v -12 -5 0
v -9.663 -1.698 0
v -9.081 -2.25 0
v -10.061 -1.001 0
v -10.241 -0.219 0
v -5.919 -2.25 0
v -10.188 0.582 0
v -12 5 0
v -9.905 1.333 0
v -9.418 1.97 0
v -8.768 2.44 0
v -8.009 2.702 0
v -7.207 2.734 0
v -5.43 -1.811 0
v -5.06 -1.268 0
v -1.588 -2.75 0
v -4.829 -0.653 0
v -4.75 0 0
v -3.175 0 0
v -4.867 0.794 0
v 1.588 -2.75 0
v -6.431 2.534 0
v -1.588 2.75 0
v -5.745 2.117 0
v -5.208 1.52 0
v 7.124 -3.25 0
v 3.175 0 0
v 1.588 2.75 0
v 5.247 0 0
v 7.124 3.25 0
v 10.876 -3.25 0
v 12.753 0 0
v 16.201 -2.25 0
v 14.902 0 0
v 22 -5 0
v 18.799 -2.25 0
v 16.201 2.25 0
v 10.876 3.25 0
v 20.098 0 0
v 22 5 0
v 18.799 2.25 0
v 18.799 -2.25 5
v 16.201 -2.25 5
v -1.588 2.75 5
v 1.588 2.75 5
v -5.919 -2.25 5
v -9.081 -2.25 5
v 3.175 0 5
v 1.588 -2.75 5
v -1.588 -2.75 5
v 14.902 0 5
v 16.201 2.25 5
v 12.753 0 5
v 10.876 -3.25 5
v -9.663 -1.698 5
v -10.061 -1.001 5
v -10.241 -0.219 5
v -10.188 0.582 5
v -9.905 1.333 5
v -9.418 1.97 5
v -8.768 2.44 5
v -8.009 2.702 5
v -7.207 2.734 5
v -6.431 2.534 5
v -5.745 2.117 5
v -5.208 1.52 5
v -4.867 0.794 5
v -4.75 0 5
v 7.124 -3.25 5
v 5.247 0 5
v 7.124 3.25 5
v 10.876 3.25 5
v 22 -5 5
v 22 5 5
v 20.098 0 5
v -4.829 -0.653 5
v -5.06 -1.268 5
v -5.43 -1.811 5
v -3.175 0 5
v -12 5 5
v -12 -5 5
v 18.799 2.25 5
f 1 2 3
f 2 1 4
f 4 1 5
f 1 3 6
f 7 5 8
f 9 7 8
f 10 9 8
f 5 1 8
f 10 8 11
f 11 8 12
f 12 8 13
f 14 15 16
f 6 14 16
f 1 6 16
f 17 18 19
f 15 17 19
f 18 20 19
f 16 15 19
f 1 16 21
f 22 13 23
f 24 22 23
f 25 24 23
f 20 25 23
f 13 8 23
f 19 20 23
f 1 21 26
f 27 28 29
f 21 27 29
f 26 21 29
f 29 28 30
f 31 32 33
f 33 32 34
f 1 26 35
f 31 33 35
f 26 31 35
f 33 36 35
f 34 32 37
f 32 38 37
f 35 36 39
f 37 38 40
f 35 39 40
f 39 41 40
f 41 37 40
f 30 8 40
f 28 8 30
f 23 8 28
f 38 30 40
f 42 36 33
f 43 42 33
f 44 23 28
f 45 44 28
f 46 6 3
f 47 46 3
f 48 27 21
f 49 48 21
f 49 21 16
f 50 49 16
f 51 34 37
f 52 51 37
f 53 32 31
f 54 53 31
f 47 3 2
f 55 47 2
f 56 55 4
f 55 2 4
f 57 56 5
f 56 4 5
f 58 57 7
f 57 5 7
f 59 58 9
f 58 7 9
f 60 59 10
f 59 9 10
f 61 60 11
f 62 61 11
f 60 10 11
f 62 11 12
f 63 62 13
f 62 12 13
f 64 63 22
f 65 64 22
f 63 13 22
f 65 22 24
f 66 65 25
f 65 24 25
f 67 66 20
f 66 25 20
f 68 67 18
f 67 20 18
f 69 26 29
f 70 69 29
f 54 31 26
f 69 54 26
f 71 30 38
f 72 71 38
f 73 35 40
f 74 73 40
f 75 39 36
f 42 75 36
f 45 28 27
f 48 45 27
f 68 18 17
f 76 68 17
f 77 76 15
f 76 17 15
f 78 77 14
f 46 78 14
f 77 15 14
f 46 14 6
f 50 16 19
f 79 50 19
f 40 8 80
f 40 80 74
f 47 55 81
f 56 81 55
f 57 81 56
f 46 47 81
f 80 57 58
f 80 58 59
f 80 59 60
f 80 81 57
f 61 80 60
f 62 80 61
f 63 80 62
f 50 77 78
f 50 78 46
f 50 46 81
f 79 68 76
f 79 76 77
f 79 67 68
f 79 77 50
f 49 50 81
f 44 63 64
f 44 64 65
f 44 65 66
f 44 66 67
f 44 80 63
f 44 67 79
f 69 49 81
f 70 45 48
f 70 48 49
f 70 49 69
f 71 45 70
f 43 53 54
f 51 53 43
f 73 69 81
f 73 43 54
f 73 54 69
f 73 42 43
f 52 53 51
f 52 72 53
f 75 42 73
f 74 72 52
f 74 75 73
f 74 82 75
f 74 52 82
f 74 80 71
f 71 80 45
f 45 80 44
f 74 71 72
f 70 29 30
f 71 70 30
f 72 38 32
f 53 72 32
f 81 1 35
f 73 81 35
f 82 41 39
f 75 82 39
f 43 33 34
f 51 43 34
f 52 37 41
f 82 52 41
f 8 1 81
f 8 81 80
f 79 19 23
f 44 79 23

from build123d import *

# Parameters (mm, degrees)
F0_W     = 34
F0_H     = 10
F1_DEPTH = 5


with BuildPart() as f1:
    # F0 (on Top) → F1 (new body)
    with BuildSketch(Plane.XY):
        with Locations((5, 0)):
            Rectangle(F0_W, F0_H)
        with BuildLine():
            ThreePointArc((-9.081139, -2.25), (-8.767748, 2.440352), (-4.75, 0))
            ThreePointArc((-4.75, 0), (-5.059648, -1.267748), (-5.918861, -2.25))
            ThreePointArc((-5.918861, -2.25), (-7.5, -2.75), (-9.081139, -2.25))
        make_face(mode=Mode.SUBTRACT)
        Polygon((-3.175426, 0), (-1.587713, 2.75), (1.587713, 2.75), (3.175426, 0), (1.587713, -2.75), (-1.587713, -2.75), align=None, mode=Mode.SUBTRACT)
        Polygon((5.247223, 0), (7.123612, 3.25), (10.876388, 3.25), (12.752777, 0), (10.876388, -3.25), (7.123612, -3.25), align=None, mode=Mode.SUBTRACT)
        Polygon((20.098076, 0), (18.799038, -2.25), (16.200962, -2.25), (14.901924, 0), (16.200962, 2.25), (18.799038, 2.25), align=None, mode=Mode.SUBTRACT)
        with BuildLine():
            Line((-5.918861, -2.25), (-9.081139, -2.25))
            ThreePointArc((-9.081139, -2.25), (-7.5, -2.75), (-5.918861, -2.25))
        make_face()
    extrude(amount=F1_DEPTH)


solid = f1.part
